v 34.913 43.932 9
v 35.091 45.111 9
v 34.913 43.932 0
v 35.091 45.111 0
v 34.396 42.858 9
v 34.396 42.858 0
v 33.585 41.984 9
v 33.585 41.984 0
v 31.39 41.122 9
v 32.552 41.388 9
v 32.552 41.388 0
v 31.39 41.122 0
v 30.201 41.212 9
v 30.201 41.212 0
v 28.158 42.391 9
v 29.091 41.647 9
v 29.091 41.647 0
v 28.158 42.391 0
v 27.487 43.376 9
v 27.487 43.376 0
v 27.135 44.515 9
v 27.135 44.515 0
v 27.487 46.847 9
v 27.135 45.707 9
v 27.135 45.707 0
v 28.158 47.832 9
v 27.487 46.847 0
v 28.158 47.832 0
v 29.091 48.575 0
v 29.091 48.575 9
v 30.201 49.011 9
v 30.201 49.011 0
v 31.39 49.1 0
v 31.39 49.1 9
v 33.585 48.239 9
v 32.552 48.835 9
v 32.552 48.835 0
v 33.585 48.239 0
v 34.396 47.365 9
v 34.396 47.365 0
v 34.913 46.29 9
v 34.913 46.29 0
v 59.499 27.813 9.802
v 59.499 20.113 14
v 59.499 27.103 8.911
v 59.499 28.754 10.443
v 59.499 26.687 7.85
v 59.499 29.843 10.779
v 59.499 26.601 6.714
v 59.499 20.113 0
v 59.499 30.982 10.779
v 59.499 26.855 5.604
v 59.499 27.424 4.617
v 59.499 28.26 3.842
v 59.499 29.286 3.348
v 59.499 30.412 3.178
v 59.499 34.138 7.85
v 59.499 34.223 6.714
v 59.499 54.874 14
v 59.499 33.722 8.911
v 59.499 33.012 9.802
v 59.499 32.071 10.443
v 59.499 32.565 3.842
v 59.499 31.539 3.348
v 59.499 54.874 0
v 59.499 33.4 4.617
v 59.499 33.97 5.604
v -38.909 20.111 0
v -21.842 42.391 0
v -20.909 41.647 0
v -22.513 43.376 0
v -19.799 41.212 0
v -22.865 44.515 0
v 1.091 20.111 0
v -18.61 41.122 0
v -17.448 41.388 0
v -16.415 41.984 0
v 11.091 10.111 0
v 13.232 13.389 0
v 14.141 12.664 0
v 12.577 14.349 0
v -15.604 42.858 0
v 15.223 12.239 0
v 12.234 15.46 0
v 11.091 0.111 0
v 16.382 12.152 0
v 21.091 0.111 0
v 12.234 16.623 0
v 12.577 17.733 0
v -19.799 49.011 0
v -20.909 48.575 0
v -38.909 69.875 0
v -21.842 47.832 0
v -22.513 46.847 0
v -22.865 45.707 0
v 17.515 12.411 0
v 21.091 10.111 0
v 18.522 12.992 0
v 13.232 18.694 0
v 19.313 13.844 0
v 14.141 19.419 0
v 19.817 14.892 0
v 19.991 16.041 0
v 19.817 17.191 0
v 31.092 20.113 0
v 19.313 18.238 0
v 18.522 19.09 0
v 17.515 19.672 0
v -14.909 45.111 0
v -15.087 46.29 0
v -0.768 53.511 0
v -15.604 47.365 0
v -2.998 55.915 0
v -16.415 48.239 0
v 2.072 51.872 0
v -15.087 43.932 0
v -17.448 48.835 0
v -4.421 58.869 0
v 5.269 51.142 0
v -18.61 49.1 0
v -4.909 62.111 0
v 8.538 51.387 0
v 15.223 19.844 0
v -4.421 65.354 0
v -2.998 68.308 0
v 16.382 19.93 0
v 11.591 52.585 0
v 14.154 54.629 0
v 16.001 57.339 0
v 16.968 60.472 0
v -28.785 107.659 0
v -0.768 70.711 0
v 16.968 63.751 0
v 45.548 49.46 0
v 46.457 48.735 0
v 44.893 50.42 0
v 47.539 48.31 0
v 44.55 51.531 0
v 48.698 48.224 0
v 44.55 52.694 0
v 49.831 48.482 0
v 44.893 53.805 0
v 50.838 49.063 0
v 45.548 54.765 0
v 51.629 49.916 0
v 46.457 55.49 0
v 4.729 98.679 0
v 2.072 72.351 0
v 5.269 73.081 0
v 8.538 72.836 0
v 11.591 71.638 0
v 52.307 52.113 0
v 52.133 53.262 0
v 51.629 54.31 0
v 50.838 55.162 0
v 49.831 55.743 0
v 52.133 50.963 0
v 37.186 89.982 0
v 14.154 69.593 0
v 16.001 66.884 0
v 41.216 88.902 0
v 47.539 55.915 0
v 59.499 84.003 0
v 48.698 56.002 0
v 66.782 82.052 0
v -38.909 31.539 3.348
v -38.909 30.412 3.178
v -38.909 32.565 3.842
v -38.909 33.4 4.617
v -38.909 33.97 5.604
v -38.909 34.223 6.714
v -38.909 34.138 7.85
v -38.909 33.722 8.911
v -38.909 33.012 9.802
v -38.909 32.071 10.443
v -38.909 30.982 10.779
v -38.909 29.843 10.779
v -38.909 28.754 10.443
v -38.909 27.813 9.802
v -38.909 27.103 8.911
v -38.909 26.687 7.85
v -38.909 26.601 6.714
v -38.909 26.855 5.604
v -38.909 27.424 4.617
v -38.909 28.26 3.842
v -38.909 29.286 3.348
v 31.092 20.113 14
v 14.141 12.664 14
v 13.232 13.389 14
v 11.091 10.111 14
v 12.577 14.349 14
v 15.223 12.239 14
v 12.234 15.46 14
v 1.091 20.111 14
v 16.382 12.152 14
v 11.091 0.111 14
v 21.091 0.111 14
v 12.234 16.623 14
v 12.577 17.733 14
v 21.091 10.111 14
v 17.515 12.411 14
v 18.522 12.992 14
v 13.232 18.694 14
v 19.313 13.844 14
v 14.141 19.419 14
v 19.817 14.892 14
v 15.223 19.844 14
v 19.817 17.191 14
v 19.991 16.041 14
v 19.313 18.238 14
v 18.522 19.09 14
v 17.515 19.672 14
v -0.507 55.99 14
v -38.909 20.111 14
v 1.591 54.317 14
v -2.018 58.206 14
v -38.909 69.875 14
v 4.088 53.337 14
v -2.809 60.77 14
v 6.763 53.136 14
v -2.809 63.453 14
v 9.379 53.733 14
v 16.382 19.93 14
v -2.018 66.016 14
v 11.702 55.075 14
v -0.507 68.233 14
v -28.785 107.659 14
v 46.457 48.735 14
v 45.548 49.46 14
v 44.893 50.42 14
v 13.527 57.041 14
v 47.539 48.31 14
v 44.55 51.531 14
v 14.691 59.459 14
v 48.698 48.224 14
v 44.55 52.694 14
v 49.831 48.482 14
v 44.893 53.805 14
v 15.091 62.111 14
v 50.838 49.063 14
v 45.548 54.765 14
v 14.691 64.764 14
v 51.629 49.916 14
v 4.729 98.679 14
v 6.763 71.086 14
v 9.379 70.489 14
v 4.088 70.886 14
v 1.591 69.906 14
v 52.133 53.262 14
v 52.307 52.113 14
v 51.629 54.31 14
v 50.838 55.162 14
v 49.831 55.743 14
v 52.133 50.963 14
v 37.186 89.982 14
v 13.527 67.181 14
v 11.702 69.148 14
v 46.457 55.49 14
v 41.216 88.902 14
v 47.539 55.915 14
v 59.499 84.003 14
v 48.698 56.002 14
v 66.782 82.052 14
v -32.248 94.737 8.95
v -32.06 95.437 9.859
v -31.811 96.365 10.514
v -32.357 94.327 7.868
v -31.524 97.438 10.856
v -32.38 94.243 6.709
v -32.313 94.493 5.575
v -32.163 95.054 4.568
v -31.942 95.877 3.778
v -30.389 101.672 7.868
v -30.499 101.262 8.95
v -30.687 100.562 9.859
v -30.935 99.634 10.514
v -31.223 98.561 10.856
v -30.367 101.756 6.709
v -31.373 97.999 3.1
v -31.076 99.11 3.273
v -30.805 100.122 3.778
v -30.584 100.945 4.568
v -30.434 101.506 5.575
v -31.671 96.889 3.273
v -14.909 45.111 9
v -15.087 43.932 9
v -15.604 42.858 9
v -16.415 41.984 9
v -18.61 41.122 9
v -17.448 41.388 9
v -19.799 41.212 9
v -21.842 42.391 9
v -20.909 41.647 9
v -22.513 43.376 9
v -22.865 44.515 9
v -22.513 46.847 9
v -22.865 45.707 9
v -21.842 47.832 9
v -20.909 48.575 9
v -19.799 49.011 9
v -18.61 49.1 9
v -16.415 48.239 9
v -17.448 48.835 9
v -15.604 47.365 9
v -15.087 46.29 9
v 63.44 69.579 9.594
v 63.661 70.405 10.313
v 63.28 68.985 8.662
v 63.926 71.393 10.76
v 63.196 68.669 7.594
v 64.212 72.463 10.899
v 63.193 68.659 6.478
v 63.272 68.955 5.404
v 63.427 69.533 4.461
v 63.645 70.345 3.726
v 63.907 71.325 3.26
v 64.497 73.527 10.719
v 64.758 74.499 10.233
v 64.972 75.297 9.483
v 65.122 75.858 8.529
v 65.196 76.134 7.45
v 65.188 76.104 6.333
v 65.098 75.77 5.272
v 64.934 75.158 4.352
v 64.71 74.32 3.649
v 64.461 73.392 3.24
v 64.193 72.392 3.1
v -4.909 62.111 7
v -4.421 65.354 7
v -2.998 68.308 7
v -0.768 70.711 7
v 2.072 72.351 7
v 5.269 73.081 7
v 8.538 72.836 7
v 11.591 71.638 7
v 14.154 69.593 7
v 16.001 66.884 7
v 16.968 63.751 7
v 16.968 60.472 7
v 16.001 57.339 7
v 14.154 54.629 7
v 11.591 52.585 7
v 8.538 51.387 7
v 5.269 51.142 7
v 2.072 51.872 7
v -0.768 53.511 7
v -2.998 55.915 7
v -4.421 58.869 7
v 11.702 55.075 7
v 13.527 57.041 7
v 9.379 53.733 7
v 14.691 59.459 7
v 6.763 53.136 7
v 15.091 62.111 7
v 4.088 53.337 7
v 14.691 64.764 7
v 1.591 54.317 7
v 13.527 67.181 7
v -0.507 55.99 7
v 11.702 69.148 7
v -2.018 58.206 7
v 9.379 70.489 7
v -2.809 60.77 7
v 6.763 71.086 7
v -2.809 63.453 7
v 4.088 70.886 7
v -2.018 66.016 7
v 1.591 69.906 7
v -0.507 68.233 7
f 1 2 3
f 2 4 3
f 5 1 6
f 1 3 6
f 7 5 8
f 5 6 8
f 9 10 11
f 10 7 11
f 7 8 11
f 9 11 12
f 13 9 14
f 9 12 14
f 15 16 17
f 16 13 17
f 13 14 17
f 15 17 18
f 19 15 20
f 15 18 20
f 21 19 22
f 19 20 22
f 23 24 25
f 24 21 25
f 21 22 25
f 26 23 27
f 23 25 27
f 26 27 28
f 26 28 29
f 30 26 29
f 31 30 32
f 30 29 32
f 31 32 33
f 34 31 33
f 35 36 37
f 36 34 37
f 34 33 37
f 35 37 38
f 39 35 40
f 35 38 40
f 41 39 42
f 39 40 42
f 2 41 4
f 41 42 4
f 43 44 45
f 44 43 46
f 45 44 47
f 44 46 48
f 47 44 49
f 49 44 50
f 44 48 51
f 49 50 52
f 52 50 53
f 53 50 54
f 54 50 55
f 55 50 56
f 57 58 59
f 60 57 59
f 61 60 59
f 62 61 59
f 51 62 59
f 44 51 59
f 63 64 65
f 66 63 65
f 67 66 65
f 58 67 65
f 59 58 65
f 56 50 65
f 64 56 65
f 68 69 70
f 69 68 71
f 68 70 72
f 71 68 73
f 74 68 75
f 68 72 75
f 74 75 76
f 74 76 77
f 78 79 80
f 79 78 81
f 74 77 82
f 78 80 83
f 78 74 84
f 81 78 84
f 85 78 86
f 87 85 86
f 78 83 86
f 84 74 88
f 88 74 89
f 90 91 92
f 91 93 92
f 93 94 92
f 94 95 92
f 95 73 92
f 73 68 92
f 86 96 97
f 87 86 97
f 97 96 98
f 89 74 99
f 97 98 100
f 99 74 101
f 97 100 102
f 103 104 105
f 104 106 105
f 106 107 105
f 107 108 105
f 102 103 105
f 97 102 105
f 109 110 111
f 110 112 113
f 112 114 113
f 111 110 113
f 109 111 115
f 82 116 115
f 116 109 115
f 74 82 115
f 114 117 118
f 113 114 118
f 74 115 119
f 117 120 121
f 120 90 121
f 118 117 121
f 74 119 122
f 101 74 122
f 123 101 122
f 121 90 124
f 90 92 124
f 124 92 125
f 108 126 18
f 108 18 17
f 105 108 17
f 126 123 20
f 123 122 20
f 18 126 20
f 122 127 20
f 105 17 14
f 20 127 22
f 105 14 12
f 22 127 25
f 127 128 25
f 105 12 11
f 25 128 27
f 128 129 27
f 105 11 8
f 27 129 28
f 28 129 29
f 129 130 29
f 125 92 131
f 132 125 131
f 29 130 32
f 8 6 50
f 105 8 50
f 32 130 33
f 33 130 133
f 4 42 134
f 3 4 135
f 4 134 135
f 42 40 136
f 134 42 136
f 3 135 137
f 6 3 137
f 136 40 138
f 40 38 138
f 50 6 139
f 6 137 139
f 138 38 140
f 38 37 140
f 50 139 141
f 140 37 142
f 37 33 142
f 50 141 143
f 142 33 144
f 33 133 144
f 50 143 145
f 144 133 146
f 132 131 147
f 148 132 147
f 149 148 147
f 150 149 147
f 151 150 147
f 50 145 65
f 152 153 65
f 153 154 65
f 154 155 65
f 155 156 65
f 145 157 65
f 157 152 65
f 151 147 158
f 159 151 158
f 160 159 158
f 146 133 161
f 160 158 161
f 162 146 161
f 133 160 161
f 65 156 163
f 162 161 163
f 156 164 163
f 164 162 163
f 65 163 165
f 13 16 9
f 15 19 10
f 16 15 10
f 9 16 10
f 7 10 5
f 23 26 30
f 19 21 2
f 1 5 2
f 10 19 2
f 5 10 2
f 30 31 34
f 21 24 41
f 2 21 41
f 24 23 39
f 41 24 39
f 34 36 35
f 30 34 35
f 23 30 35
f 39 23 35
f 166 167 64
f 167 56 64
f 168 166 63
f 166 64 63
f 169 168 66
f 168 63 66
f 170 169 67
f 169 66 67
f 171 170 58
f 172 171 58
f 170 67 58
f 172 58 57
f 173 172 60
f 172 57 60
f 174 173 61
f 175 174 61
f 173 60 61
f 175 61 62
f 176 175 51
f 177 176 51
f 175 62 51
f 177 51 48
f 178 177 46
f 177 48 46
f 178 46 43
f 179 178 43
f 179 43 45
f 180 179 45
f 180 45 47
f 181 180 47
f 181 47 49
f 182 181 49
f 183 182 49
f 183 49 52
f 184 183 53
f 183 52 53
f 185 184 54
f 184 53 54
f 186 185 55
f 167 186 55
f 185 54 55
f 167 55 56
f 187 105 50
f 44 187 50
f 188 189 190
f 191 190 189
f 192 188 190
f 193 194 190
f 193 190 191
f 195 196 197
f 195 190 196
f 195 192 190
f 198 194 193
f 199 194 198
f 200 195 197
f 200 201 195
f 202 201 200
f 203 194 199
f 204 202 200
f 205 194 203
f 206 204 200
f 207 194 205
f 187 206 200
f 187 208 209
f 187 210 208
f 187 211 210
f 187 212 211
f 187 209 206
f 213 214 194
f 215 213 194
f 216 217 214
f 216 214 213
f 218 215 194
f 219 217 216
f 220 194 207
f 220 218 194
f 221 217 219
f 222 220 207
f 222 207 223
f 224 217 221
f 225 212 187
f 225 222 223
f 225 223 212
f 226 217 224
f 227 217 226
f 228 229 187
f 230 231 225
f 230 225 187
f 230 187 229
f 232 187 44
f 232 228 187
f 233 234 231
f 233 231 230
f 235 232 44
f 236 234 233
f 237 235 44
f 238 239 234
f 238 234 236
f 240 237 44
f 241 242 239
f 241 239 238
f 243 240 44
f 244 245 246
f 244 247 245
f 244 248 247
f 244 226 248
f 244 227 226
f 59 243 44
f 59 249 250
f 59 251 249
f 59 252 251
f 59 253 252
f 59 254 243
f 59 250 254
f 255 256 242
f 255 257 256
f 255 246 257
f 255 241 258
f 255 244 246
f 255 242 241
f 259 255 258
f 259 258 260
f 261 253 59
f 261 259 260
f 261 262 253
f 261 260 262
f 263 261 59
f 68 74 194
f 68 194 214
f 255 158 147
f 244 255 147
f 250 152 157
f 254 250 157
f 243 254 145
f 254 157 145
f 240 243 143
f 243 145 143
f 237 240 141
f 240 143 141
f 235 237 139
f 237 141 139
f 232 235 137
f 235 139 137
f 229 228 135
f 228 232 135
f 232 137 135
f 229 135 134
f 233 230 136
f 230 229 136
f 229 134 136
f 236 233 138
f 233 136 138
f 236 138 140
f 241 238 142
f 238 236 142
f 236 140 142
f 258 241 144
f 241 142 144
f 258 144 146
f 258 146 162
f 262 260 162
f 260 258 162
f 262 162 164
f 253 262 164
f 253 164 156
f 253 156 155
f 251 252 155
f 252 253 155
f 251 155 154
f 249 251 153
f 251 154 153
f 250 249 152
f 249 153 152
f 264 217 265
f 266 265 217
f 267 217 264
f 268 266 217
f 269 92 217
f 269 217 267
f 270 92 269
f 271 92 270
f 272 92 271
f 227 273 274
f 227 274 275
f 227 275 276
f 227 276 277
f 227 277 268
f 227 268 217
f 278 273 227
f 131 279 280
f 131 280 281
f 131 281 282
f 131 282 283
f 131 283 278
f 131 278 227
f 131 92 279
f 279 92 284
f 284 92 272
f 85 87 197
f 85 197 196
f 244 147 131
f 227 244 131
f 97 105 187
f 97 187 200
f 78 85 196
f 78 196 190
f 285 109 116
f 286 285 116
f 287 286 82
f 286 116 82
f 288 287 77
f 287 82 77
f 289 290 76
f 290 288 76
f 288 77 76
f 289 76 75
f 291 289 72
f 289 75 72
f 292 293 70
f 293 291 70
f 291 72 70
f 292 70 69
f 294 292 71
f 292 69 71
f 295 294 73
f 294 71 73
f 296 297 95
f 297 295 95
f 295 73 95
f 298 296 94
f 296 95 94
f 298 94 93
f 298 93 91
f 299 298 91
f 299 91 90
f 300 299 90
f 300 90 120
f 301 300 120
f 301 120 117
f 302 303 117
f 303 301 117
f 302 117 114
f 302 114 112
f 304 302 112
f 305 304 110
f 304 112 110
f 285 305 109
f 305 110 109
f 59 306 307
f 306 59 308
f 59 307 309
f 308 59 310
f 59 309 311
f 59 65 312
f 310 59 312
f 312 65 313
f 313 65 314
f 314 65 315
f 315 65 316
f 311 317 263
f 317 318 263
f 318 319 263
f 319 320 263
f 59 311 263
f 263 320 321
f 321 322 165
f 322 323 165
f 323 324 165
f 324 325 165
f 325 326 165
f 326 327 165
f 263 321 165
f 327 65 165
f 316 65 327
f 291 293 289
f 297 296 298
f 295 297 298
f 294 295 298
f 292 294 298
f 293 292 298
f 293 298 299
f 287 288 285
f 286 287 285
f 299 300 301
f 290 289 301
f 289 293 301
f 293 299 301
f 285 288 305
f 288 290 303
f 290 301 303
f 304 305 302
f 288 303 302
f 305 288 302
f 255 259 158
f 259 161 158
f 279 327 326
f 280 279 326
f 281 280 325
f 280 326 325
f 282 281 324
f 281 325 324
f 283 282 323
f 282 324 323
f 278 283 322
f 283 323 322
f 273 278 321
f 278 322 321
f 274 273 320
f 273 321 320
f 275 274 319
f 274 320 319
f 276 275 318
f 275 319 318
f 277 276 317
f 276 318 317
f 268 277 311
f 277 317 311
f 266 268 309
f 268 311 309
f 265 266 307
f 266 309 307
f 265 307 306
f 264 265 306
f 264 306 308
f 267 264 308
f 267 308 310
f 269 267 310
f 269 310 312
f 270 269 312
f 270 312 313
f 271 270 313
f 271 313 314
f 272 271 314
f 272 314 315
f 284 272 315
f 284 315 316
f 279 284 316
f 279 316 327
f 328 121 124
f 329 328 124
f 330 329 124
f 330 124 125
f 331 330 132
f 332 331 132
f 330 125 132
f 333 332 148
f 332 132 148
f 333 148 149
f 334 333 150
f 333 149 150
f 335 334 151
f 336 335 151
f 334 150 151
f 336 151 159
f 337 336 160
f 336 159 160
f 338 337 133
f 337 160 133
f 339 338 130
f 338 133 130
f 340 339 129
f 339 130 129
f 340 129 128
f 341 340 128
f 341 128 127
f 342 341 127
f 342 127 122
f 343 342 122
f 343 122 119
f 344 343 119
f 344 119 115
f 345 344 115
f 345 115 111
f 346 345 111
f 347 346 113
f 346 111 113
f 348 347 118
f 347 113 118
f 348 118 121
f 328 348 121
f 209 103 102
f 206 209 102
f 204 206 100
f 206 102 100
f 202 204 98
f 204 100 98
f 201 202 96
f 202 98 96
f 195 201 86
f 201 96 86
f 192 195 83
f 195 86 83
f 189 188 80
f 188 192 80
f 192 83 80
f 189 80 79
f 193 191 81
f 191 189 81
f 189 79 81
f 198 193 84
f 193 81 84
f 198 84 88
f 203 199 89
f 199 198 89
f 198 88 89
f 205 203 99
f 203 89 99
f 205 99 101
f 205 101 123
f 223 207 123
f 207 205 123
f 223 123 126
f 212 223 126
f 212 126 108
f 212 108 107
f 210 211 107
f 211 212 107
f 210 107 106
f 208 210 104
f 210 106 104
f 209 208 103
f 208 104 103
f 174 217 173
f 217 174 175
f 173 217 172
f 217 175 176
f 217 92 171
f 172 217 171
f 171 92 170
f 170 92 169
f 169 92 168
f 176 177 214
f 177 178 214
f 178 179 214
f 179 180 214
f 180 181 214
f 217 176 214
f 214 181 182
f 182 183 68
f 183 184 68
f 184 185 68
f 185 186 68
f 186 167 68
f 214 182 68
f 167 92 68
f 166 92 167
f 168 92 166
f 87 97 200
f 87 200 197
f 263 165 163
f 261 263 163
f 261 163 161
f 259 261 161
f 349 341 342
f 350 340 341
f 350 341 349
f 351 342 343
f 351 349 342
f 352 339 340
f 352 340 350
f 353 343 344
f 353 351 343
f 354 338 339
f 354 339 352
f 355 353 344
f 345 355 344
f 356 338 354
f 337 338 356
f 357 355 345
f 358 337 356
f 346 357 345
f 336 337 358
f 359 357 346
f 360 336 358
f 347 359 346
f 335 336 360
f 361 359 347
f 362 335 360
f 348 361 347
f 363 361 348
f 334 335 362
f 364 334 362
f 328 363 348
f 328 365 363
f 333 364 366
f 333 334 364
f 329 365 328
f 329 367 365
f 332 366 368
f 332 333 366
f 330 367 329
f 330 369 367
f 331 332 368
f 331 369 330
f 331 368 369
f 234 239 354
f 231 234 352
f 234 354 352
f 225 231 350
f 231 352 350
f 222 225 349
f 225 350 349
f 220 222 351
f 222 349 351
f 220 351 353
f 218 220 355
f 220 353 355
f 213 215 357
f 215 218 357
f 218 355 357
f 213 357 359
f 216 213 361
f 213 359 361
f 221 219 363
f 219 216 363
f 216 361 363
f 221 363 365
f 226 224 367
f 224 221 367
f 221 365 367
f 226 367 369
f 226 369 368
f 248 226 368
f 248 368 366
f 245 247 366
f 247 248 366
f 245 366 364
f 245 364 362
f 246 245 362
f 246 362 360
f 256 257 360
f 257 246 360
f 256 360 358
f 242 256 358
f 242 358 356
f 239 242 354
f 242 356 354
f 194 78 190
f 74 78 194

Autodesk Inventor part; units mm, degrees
ref_plane "YZ Plane" through (0, 0, 0) normal (1, 0, 0) x (0, 1, 0)
ref_plane "XZ Plane" through (0, 0, 0) normal (0, 1, 0) x (-1, 0, 0)
ref_plane "XY Plane" through (0, 0, 0) normal (0, 0, 1) x (1, 0, 0)
sketch "Sketch1" plane through (0, 0, 0) normal (0, 0, 1) x (1, 0, 0)
  line L0 (11.0906, 0.1113) -> (11.0906, 10.1113)
  line L1 (11.0906, 10.1113) -> (1.0906, 20.1113)
  line L2 (31.0918, 20.1126) -> (21.0906, 10.1113)
  line L3 (21.0906, 10.1113) -> (21.0906, 0.1113)
  line L4 (21.0906, 0.1113) -> (11.0906, 0.1113)
  circle A0 centre (16.0906, 16.0413) radius 3.9
  line L5 (37.1863, 89.9817) -> (4.7287, 98.6787)
  line L6 (41.216, 88.9019) -> (37.1863, 89.9817)
  circle A1 centre (31.0906, 45.1113) radius 4
  circle A2 centre (-18.9094, 45.1113) radius 4
  line L7 (1.0906, 20.1113) -> (-38.9094, 20.1113)
  line L8 (4.7287, 98.6787) -> (-28.7852, 107.6587)
  circle A3 centre (6.0906, 62.1113) radius 9
  line L9 (-38.9094, 69.8746) -> (-28.7852, 107.6587)
  line L10 (31.0918, 20.1126) -> (59.4992, 20.1126)
  line L11 (59.4992, 20.1126) -> (59.4992, 54.8735)
  line L12 (59.4992, 84.003) -> (41.216, 88.9019)
  line L13 (59.4992, 54.8735) -> (66.7815, 82.0517)
  line L14 (66.7815, 82.0517) -> (59.4992, 84.003)
  circle A4 centre (48.4066, 52.1126) radius 3.9
  line L15 (-38.9094, 69.8746) -> (-38.9094, 20.1113)
  point P0 (0, 0)
  dimension "d2" = 10
  dimension "d5" = 135
  dimension "d6" = 135
  dimension "d7" = 10
  dimension "d8" = 10
  dimension "d11" = 7.8
  dimension "d14" = 8
  dimension "d15" = 8
  dimension "d16" = 50
  dimension "d20" = 18
  dimension "d21" = 17
  dimension "d24" = 25
  dimension "d30" = 90
  dimension "d31" = 39.117
  dimension "d51" = 7.8
  dimension "d52" = 10
  dimension "d53" = 32
  dimension "d71" = 34.7609
  dimension "d72" = 25
  dimension "d73" = 25
  dimension "d74" = 5
  dimension "d75" = 49.7632
  dimension "d77" = 28.4086
extrude "Extrusion6" add sketch "Sketch1" along normal blind 14
sketch "Sketch6" plane through (59.4992, 20.1126, 0) normal (1, 0, 0) x (0, 0, -1)
  circle A0 centre (-7, 10.2998) radius 3.8217
  line L0 (0, -20.0012) -> (-14, -20.0012) projected
  point P0 (0, -20.1126)
  dimension "d76" = 30.301
extrude "Extrusion7" cut sketch "Sketch6" against normal blind 120
sketch "Sketch7" plane through (66.7815, 82.0517, 14) normal (0.9659, -0.2588, 0) x (0, 0, -1)
  line L0 (14, 0) -> (0, 0) projected
  circle A0 centre (7, -10) radius 3.9
  point P0 (14, -96.5401)
  dimension "d58" = 7.8
  dimension "d60" = 10
extrude "Extrusion8" cut sketch "Sketch7" against normal blind 120
sketch "Sketch8" plane through (0, 0, 0) normal (0, 0, -1) x (-1, 0, 0)
  circle A0 centre (-6.0906, 62.1113) radius 9 projected
  circle A1 centre (-6.0906, 62.1113) radius 11
  point P0 (0, 0)
  dimension "d63" = 22
extrude "Extrusion9" cut sketch "Sketch8" against normal blind 7
sketch "Sketch9" plane through (0, 0, 14) normal (0, 0, 1) x (1, 0, 0)
  circle A0 centre (-18.9094, 45.1113) radius 4 projected
  circle A1 centre (31.0906, 45.1113) radius 4 projected
  point P0 (0, 0)
extrude "Extrusion10" add sketch "Sketch9" against normal blind 5
properties part number "Vertex Bottom tensioner left"
